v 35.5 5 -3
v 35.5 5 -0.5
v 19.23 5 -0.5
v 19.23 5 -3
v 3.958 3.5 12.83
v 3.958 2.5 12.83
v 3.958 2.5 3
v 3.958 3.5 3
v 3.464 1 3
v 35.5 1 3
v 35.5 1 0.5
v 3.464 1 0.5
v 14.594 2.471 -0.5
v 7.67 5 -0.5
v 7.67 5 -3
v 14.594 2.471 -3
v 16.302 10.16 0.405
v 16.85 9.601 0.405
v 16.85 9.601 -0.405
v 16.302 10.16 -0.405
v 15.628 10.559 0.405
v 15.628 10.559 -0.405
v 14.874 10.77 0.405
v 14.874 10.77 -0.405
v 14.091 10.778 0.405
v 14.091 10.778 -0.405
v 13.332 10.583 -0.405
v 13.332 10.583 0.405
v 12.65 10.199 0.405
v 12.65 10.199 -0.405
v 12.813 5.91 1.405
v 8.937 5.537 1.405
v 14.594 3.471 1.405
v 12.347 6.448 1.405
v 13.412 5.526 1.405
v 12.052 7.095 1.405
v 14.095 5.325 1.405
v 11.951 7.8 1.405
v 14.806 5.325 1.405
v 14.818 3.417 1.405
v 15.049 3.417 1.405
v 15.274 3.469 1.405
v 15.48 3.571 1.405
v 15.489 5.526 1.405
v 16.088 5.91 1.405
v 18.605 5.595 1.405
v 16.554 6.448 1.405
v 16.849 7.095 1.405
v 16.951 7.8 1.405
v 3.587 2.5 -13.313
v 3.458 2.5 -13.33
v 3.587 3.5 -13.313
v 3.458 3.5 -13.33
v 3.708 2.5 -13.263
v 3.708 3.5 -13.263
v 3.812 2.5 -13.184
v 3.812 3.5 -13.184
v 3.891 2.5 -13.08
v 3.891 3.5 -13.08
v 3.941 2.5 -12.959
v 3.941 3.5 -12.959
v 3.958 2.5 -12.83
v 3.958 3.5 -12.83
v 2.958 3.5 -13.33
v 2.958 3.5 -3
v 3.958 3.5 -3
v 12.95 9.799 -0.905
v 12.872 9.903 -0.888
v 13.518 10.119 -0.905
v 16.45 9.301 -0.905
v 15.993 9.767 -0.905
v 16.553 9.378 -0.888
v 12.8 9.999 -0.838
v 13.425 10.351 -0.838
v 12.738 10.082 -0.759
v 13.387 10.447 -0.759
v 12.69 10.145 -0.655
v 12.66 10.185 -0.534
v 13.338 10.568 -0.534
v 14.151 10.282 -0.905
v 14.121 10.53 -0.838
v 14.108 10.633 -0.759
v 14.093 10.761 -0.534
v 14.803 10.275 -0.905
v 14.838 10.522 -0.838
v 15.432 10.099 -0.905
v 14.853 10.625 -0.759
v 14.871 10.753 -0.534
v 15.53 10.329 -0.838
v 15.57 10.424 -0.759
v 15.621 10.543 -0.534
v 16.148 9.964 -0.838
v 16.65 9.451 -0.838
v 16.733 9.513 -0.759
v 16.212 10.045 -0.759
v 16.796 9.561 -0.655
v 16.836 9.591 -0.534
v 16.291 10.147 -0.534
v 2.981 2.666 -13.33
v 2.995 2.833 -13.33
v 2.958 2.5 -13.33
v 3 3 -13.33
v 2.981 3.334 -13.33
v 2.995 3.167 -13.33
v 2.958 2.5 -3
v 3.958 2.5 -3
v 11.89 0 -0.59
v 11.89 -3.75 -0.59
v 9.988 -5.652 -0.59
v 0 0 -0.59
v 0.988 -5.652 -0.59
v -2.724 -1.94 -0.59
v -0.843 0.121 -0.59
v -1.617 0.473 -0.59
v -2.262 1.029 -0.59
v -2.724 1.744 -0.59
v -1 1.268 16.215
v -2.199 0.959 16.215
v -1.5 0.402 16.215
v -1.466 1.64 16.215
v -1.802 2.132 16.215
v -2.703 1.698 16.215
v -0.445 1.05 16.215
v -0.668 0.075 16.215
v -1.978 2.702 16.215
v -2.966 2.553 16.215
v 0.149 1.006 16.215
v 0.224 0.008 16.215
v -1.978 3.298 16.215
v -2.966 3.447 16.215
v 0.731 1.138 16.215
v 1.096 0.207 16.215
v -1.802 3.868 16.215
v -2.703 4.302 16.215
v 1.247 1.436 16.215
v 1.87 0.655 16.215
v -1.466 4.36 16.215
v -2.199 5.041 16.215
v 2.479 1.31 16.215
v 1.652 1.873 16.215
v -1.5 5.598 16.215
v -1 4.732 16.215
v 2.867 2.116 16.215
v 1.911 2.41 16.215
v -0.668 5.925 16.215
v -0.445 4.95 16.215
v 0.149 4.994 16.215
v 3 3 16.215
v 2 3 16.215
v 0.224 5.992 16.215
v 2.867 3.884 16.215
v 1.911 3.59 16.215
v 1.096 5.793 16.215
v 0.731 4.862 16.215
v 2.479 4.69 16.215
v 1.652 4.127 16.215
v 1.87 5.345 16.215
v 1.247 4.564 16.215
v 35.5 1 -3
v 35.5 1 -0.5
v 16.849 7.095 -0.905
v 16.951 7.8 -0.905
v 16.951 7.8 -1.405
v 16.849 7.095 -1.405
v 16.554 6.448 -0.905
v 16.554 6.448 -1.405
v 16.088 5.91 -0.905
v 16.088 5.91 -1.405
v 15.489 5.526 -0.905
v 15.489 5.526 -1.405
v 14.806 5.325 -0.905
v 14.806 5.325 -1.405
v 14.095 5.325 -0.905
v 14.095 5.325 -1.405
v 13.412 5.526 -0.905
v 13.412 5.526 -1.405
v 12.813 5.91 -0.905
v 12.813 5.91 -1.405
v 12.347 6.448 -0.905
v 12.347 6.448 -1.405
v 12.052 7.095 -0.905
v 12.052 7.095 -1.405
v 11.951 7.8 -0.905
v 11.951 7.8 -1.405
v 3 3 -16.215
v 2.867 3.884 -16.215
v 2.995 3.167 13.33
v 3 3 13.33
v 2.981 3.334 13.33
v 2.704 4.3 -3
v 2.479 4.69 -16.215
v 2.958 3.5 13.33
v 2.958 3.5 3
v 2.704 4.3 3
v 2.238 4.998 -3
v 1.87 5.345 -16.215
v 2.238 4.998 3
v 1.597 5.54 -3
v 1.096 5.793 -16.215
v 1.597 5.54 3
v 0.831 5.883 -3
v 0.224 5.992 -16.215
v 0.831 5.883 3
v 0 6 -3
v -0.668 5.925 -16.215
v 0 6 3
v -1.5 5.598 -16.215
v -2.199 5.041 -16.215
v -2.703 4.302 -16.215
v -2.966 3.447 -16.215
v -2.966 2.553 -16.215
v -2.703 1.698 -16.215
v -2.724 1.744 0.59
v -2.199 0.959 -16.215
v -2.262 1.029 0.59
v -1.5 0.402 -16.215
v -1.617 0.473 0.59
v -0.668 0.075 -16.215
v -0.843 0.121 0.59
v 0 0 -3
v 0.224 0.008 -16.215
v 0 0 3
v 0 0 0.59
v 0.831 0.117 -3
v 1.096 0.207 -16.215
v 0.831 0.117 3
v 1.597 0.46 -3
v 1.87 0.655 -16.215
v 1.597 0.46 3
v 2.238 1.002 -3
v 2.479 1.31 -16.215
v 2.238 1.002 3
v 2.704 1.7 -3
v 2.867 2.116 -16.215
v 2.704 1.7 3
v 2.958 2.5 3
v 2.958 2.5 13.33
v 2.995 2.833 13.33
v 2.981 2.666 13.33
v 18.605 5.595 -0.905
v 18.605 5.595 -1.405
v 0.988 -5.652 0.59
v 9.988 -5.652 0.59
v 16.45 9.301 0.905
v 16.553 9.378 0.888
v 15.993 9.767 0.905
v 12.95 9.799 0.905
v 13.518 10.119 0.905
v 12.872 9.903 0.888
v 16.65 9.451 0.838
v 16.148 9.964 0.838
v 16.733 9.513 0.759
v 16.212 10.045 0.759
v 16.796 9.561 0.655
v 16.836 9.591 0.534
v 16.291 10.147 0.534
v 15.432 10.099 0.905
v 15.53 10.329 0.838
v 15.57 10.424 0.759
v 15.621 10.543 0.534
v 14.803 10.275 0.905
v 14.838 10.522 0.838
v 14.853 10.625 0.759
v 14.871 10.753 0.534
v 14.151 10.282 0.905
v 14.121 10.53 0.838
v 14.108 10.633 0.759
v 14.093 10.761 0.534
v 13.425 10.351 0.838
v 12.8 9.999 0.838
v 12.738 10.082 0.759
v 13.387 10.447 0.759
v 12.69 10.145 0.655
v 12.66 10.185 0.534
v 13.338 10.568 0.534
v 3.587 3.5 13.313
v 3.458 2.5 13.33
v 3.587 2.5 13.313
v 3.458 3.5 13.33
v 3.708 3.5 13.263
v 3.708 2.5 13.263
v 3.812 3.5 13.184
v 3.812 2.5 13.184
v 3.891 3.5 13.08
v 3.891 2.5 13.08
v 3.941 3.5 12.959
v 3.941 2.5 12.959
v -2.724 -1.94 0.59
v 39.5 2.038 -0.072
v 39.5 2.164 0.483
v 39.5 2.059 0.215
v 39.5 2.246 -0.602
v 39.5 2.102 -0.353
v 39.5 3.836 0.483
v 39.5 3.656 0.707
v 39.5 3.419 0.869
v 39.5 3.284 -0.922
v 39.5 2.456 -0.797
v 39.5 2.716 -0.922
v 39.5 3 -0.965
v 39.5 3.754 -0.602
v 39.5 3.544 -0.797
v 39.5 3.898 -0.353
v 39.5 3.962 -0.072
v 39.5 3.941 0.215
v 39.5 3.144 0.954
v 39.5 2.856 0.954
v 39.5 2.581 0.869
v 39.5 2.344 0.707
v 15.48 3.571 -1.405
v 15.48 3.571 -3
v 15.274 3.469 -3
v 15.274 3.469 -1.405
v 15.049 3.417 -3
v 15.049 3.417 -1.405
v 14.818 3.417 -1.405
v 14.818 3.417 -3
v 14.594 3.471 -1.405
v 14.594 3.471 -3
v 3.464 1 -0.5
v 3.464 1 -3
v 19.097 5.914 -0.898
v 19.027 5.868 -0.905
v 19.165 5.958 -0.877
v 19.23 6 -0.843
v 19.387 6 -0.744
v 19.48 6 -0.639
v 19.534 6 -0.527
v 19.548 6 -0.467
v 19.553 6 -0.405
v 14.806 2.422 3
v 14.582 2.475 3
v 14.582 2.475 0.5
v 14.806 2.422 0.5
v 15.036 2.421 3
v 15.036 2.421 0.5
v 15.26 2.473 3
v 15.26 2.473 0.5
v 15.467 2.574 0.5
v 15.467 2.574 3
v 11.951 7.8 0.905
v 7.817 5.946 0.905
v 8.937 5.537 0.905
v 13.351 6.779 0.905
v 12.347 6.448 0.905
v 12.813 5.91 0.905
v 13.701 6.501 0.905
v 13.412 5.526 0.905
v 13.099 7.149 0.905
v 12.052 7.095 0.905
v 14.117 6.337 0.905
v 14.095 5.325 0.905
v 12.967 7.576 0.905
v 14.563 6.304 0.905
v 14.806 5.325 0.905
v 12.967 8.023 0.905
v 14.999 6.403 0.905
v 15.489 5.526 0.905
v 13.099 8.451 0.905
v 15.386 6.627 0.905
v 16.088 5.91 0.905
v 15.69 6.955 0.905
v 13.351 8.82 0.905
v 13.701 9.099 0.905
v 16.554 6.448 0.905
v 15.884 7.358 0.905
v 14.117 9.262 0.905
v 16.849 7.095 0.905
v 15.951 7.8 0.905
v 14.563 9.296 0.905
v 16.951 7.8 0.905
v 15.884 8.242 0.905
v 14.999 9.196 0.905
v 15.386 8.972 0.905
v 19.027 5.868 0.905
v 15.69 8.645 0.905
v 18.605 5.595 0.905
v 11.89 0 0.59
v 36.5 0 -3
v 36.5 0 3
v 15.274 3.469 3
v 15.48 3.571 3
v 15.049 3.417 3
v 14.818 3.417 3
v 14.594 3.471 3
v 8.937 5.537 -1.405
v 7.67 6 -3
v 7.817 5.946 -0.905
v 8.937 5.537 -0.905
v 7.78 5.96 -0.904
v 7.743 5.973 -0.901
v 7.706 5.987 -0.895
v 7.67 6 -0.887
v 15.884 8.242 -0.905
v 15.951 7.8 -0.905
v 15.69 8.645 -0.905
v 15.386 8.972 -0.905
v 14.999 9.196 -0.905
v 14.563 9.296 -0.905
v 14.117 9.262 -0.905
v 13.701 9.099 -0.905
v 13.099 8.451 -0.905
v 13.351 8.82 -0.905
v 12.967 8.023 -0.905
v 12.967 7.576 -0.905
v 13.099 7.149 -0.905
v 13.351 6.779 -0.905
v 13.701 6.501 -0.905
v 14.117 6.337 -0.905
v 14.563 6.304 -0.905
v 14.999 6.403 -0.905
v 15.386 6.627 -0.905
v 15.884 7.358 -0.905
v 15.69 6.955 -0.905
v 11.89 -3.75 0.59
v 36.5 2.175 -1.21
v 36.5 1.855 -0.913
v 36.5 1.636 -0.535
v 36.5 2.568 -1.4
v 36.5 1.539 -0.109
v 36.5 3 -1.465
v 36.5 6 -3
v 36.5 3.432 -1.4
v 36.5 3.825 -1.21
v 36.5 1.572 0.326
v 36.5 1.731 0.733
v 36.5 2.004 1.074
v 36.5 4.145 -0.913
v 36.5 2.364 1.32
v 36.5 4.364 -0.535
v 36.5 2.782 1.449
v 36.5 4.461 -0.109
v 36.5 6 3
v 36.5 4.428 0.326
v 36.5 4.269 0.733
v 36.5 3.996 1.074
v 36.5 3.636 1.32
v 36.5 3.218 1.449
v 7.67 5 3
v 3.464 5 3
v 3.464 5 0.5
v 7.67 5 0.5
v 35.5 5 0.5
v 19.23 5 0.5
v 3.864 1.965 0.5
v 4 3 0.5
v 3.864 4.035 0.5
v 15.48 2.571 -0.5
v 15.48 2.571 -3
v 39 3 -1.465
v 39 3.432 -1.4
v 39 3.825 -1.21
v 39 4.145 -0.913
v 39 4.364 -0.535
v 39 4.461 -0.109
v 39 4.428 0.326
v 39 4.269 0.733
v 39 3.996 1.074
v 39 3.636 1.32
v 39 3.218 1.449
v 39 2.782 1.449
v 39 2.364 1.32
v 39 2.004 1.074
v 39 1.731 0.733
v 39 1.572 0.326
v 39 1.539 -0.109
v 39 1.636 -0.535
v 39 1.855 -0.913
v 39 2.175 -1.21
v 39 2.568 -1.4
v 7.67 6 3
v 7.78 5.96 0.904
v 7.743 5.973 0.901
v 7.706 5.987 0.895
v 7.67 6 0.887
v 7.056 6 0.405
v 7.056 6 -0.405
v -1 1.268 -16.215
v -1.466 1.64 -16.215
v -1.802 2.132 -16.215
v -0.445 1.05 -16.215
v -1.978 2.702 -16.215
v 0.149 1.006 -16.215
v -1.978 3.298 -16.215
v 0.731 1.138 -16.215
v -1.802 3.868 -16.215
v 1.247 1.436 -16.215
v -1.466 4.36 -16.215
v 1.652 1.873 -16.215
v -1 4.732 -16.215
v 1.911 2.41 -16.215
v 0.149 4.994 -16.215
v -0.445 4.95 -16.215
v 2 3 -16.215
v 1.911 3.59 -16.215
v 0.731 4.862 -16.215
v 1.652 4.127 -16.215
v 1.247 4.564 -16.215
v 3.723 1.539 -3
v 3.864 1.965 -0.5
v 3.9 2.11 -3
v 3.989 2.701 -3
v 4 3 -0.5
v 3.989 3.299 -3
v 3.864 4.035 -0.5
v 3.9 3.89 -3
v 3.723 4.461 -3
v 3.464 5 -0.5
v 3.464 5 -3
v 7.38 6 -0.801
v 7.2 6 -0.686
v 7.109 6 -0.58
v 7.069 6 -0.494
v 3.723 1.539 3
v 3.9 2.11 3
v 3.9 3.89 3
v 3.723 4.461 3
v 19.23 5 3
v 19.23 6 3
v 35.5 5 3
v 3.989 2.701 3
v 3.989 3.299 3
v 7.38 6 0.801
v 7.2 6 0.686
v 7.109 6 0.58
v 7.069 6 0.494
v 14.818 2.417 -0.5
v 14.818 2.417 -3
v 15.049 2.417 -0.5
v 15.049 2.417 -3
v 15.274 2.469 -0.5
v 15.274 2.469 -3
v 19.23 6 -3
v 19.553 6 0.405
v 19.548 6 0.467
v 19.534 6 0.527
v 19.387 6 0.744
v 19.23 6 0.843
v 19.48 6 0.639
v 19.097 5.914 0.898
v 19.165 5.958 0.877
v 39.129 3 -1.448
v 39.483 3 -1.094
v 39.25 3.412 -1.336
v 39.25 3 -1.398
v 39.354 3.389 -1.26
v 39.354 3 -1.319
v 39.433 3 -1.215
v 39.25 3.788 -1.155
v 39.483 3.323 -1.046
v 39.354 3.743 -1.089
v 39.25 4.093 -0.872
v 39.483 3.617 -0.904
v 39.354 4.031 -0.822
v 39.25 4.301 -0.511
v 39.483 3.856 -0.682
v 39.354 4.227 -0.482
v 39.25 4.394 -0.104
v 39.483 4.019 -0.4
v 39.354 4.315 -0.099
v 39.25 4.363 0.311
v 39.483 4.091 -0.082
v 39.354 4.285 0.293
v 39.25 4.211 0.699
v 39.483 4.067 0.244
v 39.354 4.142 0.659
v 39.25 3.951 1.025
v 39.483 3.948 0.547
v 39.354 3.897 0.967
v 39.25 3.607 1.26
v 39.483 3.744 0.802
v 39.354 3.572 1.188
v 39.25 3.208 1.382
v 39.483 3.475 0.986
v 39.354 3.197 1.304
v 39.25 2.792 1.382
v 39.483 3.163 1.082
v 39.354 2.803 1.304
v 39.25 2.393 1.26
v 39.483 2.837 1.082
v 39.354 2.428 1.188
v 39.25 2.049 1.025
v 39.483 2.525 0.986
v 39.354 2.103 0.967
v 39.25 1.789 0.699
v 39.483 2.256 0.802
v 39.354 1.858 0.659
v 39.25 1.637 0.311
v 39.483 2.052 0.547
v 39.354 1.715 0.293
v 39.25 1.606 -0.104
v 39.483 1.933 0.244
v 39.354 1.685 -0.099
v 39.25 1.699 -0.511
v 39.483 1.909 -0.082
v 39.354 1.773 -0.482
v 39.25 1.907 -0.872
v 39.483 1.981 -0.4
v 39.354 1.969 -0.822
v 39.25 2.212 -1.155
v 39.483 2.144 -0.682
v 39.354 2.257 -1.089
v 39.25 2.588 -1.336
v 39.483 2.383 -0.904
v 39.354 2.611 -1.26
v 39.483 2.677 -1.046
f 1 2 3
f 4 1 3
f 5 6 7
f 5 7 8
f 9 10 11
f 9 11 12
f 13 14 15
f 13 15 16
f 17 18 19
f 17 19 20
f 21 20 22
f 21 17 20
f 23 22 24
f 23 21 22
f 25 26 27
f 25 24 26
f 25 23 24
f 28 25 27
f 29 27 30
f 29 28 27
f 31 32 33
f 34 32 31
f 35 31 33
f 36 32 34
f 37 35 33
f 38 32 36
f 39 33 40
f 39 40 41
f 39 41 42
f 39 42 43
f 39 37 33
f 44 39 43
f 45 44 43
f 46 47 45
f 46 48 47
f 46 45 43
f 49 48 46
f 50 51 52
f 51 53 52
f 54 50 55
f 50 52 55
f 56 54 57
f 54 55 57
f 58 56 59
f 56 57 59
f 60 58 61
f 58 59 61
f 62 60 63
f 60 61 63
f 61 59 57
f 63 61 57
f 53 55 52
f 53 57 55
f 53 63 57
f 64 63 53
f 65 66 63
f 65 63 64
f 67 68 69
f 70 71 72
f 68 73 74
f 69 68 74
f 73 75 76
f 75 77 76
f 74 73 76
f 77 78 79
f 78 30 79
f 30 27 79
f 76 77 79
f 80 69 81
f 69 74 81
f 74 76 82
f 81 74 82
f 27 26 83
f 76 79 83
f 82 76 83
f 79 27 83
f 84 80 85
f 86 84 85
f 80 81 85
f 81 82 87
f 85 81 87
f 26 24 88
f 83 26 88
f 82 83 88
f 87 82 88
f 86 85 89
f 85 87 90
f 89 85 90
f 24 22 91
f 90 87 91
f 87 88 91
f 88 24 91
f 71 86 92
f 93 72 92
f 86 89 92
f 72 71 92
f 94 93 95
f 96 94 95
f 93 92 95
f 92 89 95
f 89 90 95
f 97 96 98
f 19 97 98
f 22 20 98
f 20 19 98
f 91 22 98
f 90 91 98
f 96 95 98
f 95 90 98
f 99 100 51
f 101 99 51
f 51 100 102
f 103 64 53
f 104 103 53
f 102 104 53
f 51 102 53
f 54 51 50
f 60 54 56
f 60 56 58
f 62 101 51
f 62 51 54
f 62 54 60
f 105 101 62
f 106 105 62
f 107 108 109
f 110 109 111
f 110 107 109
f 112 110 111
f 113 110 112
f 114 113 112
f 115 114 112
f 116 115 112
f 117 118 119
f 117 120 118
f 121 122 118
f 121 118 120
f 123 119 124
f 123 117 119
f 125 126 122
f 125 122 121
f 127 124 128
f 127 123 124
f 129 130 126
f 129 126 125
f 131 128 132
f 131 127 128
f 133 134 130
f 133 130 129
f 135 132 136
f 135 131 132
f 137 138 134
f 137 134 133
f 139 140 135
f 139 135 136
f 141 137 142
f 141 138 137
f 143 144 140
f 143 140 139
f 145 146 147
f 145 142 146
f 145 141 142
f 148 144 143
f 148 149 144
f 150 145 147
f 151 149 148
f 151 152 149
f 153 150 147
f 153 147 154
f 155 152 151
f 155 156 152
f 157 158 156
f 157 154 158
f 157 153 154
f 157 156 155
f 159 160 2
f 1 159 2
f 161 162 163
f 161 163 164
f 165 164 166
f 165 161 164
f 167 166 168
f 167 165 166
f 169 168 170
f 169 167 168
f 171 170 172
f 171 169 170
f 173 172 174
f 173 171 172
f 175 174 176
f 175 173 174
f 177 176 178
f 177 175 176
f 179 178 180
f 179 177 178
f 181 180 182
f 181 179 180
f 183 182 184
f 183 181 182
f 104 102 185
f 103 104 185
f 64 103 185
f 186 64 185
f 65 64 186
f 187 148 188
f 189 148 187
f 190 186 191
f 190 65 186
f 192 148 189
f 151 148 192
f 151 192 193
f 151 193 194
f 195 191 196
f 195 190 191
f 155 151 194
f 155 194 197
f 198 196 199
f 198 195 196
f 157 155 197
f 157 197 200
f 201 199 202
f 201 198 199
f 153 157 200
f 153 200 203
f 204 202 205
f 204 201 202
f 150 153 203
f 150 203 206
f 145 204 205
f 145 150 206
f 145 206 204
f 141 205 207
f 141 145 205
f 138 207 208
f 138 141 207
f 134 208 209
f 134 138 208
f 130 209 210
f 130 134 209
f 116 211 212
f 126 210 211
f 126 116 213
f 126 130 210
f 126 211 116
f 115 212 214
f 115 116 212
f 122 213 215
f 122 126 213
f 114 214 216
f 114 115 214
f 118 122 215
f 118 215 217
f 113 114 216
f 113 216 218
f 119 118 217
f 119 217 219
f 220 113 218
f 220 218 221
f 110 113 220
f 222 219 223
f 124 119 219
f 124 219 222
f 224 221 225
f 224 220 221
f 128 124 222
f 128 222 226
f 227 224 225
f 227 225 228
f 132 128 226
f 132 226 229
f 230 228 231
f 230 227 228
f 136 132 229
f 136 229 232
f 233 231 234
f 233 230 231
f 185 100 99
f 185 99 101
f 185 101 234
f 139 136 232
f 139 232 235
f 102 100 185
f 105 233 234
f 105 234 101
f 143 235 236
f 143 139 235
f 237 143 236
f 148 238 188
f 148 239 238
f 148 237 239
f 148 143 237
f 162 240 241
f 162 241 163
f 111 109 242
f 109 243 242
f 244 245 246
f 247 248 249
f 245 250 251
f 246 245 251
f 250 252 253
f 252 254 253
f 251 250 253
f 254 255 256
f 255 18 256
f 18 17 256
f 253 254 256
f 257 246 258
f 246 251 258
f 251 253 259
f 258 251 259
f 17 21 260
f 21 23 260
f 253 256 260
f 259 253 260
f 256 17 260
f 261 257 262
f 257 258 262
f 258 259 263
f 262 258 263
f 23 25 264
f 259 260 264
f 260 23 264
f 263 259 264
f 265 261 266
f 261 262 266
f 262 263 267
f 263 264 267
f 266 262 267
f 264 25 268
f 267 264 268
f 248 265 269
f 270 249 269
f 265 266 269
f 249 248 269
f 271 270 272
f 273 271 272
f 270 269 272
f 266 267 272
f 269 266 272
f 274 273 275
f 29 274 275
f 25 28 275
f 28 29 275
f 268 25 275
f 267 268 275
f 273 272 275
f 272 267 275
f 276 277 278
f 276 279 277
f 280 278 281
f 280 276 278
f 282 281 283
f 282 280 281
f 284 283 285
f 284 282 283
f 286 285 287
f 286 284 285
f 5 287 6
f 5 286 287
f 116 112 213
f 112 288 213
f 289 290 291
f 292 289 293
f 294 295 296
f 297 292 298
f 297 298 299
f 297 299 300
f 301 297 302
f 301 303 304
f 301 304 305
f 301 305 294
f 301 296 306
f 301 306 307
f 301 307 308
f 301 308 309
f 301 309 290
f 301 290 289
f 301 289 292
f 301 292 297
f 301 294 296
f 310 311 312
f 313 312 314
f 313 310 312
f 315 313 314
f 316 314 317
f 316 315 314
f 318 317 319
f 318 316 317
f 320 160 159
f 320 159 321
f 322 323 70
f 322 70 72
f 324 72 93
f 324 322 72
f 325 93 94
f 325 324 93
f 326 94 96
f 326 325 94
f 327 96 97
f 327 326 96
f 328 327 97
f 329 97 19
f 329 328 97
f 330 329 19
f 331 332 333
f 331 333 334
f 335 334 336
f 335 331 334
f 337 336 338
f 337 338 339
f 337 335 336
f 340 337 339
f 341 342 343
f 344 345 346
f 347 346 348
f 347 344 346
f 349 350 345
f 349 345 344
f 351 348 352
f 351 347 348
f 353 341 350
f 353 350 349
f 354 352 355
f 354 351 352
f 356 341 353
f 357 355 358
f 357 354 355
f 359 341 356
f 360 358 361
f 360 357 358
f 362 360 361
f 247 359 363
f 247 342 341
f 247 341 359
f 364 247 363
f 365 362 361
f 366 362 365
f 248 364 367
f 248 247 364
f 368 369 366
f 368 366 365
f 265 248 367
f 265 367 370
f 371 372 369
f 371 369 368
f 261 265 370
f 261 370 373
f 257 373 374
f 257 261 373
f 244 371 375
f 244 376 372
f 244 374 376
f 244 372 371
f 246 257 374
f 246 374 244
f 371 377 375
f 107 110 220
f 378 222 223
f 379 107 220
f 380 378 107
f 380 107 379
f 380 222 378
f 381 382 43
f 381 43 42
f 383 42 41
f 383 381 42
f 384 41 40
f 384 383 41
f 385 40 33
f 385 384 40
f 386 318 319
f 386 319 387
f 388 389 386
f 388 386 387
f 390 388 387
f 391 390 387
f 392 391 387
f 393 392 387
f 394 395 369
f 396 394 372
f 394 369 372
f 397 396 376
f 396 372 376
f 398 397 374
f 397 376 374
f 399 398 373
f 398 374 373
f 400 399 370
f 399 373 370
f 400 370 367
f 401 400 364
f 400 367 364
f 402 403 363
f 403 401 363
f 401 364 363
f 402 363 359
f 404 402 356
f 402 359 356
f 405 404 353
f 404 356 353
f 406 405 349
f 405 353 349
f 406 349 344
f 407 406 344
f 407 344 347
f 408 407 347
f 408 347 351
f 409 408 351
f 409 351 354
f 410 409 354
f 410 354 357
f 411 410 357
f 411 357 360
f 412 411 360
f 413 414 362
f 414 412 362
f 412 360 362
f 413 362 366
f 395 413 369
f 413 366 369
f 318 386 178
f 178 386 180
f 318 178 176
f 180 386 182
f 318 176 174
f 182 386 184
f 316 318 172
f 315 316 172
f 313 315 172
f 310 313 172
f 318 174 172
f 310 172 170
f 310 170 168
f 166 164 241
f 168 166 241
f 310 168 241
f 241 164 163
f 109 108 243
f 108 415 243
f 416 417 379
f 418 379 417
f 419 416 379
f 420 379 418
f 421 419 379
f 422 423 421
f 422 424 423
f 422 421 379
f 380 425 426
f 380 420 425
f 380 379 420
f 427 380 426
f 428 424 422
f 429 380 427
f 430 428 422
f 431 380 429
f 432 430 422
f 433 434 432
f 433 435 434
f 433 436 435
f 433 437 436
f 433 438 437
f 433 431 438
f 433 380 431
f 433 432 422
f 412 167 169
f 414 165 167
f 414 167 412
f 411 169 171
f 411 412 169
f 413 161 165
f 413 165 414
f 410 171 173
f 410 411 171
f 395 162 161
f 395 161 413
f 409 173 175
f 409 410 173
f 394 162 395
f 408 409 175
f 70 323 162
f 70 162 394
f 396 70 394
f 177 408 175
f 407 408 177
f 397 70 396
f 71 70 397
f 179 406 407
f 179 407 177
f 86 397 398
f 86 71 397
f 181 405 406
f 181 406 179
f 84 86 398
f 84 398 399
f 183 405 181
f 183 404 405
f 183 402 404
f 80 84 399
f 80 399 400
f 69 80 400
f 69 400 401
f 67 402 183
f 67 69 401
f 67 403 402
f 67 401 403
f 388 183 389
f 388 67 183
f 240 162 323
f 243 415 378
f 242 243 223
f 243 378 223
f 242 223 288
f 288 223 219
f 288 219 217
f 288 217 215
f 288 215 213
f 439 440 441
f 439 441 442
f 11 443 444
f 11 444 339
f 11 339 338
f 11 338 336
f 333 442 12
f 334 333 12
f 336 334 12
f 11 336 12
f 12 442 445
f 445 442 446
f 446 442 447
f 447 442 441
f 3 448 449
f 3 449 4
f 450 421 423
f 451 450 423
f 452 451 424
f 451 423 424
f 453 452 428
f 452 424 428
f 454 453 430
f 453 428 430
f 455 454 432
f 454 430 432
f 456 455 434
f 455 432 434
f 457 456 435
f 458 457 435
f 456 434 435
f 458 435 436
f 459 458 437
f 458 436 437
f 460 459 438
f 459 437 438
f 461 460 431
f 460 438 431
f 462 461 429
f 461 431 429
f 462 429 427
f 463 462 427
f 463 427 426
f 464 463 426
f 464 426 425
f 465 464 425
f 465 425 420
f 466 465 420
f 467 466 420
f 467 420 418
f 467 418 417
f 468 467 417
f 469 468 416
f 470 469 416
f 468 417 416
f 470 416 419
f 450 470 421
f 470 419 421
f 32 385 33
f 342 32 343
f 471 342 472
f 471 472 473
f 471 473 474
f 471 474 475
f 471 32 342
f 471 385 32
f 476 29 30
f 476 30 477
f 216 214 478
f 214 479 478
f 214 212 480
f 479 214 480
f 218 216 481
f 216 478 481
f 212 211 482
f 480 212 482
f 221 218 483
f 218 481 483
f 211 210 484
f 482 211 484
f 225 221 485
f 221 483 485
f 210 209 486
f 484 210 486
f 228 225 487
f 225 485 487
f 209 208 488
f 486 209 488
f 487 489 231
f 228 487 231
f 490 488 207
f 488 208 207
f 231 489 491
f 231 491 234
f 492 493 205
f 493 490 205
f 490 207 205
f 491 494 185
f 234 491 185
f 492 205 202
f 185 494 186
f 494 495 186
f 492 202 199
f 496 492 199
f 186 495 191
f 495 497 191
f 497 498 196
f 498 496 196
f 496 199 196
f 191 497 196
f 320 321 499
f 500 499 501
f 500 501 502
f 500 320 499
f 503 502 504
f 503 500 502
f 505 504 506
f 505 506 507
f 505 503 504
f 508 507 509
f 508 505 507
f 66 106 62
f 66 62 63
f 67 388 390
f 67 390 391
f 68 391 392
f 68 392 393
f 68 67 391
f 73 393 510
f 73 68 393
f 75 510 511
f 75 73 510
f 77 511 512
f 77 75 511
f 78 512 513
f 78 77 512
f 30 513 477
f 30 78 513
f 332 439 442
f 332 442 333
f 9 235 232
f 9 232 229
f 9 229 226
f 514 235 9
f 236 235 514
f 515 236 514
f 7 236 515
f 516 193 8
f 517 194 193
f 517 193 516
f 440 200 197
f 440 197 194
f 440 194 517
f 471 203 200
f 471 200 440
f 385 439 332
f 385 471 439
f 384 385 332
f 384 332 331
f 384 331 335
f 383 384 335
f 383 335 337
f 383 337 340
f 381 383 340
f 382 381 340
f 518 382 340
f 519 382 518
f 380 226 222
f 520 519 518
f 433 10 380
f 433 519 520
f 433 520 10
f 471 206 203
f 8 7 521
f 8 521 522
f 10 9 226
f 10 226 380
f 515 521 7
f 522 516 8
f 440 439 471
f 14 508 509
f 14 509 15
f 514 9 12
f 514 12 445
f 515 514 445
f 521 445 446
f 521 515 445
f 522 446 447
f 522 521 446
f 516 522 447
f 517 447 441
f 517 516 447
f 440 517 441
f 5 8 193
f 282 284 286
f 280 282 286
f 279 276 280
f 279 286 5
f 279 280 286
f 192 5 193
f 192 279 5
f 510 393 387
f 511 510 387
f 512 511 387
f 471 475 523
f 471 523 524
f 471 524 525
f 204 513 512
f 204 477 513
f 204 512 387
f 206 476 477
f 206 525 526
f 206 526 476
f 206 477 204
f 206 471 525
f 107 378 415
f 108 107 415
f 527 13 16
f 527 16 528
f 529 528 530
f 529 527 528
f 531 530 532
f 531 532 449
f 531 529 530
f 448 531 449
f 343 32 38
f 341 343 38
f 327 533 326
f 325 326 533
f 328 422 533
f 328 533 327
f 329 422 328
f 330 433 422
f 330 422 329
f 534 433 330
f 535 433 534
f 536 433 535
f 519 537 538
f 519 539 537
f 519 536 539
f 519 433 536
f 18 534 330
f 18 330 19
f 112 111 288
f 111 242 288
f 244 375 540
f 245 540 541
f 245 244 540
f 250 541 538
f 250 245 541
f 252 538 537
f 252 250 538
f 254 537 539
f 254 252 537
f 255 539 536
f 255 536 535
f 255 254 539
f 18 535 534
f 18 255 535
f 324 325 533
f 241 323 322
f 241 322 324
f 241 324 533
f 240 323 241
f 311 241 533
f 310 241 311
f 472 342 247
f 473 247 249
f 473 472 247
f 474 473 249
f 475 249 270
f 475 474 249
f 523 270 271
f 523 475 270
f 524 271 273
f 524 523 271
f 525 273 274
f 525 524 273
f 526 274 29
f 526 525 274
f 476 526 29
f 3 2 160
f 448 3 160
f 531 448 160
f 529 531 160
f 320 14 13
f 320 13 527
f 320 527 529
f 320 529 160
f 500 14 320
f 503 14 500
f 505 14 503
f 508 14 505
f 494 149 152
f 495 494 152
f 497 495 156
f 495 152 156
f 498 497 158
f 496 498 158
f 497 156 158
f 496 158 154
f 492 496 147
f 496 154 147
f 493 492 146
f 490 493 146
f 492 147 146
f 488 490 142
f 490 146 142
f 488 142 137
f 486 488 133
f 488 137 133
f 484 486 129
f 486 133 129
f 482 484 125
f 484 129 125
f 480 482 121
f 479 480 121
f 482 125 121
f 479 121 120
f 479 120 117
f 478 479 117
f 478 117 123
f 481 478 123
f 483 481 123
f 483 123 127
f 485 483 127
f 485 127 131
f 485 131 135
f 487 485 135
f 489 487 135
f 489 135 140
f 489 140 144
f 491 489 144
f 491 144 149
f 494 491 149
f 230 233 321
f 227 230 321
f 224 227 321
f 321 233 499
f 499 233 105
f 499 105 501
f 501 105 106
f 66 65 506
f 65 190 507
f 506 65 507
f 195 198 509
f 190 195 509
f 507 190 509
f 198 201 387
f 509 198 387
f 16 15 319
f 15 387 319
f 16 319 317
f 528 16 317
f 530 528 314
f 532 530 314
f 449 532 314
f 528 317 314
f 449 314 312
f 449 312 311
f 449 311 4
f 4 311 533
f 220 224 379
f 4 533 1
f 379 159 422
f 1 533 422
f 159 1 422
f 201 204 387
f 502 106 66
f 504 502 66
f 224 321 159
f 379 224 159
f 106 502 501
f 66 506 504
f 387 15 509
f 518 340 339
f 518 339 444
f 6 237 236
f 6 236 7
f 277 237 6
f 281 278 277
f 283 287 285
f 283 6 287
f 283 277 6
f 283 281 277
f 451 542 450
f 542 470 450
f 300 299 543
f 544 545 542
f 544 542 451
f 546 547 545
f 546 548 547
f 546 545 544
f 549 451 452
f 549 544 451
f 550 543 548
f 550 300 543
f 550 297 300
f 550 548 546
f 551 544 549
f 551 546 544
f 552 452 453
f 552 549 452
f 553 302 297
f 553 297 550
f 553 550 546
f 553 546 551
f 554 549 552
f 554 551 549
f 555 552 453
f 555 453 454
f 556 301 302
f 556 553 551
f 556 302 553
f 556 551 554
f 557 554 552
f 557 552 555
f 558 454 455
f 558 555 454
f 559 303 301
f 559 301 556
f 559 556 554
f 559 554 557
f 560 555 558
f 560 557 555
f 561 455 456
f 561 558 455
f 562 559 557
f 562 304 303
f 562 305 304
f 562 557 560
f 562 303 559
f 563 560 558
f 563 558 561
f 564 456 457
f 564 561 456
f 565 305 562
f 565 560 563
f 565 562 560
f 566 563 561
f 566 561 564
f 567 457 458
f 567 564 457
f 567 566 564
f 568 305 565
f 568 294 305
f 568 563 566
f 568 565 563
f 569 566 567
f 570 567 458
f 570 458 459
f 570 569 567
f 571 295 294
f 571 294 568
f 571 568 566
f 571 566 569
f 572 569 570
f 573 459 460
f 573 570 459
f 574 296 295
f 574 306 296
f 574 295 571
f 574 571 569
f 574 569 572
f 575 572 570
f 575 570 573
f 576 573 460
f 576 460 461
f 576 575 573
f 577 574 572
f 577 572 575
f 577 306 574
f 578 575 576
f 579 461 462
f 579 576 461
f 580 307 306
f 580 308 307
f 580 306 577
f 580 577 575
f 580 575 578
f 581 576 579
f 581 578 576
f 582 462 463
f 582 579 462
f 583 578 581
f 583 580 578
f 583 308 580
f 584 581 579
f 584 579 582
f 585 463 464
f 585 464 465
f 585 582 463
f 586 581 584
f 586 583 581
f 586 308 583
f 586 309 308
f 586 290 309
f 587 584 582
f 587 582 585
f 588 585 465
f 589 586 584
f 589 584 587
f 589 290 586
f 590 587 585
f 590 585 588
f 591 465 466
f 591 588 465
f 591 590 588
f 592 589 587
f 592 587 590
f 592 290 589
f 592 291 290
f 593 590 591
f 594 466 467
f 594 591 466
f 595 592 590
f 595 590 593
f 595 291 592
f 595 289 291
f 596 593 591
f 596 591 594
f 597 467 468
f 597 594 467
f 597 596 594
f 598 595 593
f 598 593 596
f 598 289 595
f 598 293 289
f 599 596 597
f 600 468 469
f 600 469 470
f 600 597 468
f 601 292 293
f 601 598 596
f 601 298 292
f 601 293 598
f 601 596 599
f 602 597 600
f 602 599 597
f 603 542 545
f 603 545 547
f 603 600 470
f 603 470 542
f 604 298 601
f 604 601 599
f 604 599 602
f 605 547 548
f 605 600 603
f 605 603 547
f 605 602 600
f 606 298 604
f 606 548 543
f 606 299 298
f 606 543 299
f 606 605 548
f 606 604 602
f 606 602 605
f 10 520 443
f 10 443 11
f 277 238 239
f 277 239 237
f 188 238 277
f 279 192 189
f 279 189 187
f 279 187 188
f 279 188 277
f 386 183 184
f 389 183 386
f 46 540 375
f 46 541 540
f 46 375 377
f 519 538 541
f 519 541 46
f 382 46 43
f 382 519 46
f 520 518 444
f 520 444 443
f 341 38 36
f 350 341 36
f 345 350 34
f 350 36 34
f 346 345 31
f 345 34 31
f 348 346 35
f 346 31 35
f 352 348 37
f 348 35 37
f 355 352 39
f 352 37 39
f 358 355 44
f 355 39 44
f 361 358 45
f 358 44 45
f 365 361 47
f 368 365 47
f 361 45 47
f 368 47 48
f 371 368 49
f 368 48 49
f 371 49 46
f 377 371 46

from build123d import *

# Parameters (mm, degrees)
BOSS_EXTRUDE3_DEPTH  = 3
SKETCH6_R            = 1.465
BOSS_EXTRUDE7_DEPTH  = 3
FILLET1_R            = 0.5
SKETCH7_R            = 2.9999999999999982
BOSS_EXTRUDE8_DEPTH  = 16.215
BOSS_EXTRUDE9_DEPTH  = 1.405
SKETCH9_R            = 2
CUT_EXTRUDE1_DEPTH   = 35
SKETCH10_R           = 1.5000000000000009
CUT_EXTRUDE2_DEPTH   = 35
CUT_EXTRUDE3_DEPTH   = 2.5
CUT_EXTRUDE4_START   = -2.5
CUT_EXTRUDE4_DEPTH   = 2.5
BOSS_EXTRUDE10_DEPTH = 0.59
BOSS_EXTRUDE11_DEPTH = 13.33
FILLET2_R            = 0.5
FILLET3_R            = 0.5
SKETCH12_R           = 1.5000000000000009
CUT_EXTRUDE5_DEPTH   = 0.5
FILLET4_R            = 0.5
CUT_EXTRUDE6_START   = -0.5
SKETCH17_R           = 1.5000000000000009
CUT_EXTRUDE6_DEPTH   = 0.5
FILLET5_R            = 0.5


with BuildPart() as part:
    # Sketch1 → Boss-Extrude3 (new, symmetric)
    with BuildSketch(Plane.XY):
        with BuildLine():
            ThreePointArc((2.9999999999999982, 2.9999999999999973), (2.1213203435596406, 0.8786796564403563), (-5.5e-16, 0))
            Line((0, 0), (36.5, 0))
            Line((36.5, 0), (36.5, 6))
            Line((36.5, 6), (19.23, 5.999999999999999))
            Line((19.23, 5.999999999999999), (15.480454164508112, 3.571071981637192))
            ThreePointArc((15.480454164508112, 3.571071981637192), (15.048841816271192, 3.4166611598413845), (14.593679363207029, 3.4710584241003293))
            Line((14.593679363207029, 3.4710584241003297), (7.67, 5.999999999999995))
            Line((7.67, 5.999999999999995), (0, 5.9999999999999964))
            ThreePointArc((1.8e-16, 5.9999999999999964), (2.1213203435596415, 5.121320343559639), (2.9999999999999982, 2.9999999999999982))
        make_face()
    extrude(amount=BOSS_EXTRUDE3_DEPTH, both=True)

    # Sketch6 → Boss-Extrude7 (add)
    with BuildSketch(Plane(origin=(36.5, 0, 0), x_dir=(0, 0, -1), z_dir=(1, 0, 0))):
        with Locations((0, 2.999999999999999)):
            Circle(SKETCH6_R)
    extrude(amount=BOSS_EXTRUDE7_DEPTH)

    # Fillet1
    fillet1_edges = [part.edges().sort_by_distance(p)[0] for p in [
        (39.5, 2.9999999999999987, 1.465),
    ]]
    fillet(fillet1_edges, radius=FILLET1_R)

    # Sketch7 → Boss-Extrude8 (add, symmetric)
    with BuildSketch(Plane.XY):
        with Locations((0, 2.9999999999999982)):
            Circle(SKETCH7_R)
    extrude(amount=BOSS_EXTRUDE8_DEPTH, both=True)

    # Sketch8 → Boss-Extrude9 (add, symmetric)
    with BuildSketch(Plane.XY):
        with BuildLine():
            Line((7.055802237198053, 5.999999999999995), (7.67, 5.999999999999995))
            Line((7.67, 5.999999999999995), (7.67, 2.7155970544612273))
            Line((7.67, 2.7155970544612273), (19.552760462470925, 2.7155970544612273))
            Line((19.552760462470925, 2.7155970544612273), (19.552760462470925, 5.999999999999999))
            Line((19.552760462470925, 5.999999999999999), (16.849844518078097, 9.600752353739953))
            ThreePointArc((16.849844518078097, 9.600752353739953), (14.873619928851438, 10.76977515573235), (12.649594170011149, 10.19899729819309))
            Line((12.649594170011149, 10.19899729819309), (7.055802237198053, 5.999999999999995))
        make_face()
    extrude(amount=BOSS_EXTRUDE9_DEPTH, both=True)

    # Sketch9 → Cut-Extrude1 (cut)
    with BuildSketch(Plane.XY.offset(16.215)):
        with Locations((0, 2.9999999999999982)):
            Circle(SKETCH9_R)
    extrude(amount=-CUT_EXTRUDE1_DEPTH, mode=Mode.SUBTRACT)

    # Sketch10 → Cut-Extrude2 (cut)
    with BuildSketch(Plane.XY.offset(1.405)):
        with Locations((14.450596871818059, 7.799749651933077)):
            Circle(SKETCH10_R)
    extrude(amount=-CUT_EXTRUDE2_DEPTH, mode=Mode.SUBTRACT)

    # Sketch11 → Cut-Extrude3 (cut)
    with BuildSketch(Plane.XY.offset(3)):
        with BuildLine():
            Line((35.5, 4.999999999999999), (19.23, 4.999999999999999))
            Line((19.23, 4.999999999999999), (15.46672588726192, 2.5741759140057563))
            ThreePointArc((15.46672588726192, 2.5741759140057563), (15.035884938334876, 2.420860249555603), (14.581839900445662, 2.475382903620951))
            Line((14.581839900445662, 2.475382903620951), (7.67, 4.9999999999999964))
            Line((7.67, 4.9999999999999964), (3.4641016151377535, 4.9999999999999964))
            ThreePointArc((3.464101615137754, 4.9999999999999964), (3.999999999999998, 2.9999999999999982), (3.464101615137754, 0.9999999999999998))
            Line((3.4641016151377535, 0.9999999999999999), (35.5, 1))
            Line((35.5, 1), (35.5, 4.999999999999999))
        make_face()
    extrude(amount=-CUT_EXTRUDE3_DEPTH, mode=Mode.SUBTRACT)

    # Sketch14 → Cut-Extrude4 (cut)
    with BuildSketch(Plane(origin=(0, 0, -3), x_dir=(-1, 0, 0), z_dir=(0, 0, -1)).offset(CUT_EXTRUDE4_START)):
        with BuildLine():
            Line((-19.23, 4.999999999999999), (-35.5, 4.999999999999999))
            Line((-35.5, 4.999999999999999), (-35.5, 1))
            Line((-35.5, 1), (-3.46410161513775, 1))
            ThreePointArc((-3.4641016151377535, 1), (-3.999999999999998, 2.9999999999999982), (-3.4641016151377535, 4.9999999999999964))
            Line((-3.4641016151377535, 4.9999999999999964), (-7.67, 4.9999999999999964))
            Line((-7.67, 4.9999999999999964), (-14.593679363207022, 2.471058424100332))
            ThreePointArc((-14.593679363207022, 2.471058424100332), (-15.048841816271192, 2.4166611598413854), (-15.480454164508119, 2.5710719816371976))
            Line((-15.480454164508119, 2.571071981637197), (-19.23, 4.999999999999999))
        make_face()
    extrude(amount=CUT_EXTRUDE4_DEPTH, mode=Mode.SUBTRACT)

    # Sketch15 → Boss-Extrude10 (add, symmetric)
    with BuildSketch(Plane.XY):
        with BuildLine():
            Line((11.889999999999997, -3.01e-15), (11.889999999999997, -3.750000000000003))
            Line((11.889999999999997, -3.750000000000003), (9.987882758608185, -5.652117241391816))
            Line((9.987882758608185, -5.652117241391816), (0.9878827586081856, -5.652117241391818))
            Line((0.9878827586081856, -5.652117241391818), (-2.7244278426211888, -1.9398066401624436))
            Line((-2.7244278426211888, -1.9398066401624436), (-2.7244278426211888, 1.7440171456781548))
            ThreePointArc((-2.7244278426211888, 1.7440171456781548), (-1.6174132800608587, 0.47334721786258305), (0, 0))
            Line((0, 0), (11.889999999999997, -3.01e-15))
        make_face()
    extrude(amount=BOSS_EXTRUDE10_DEPTH, both=True)

    # Sketch16 → Boss-Extrude11 (add, symmetric)
    with BuildSketch(Plane.XY):
        with BuildLine():
            Line((3.9580398915498063, 2.4999999999999982), (3.9580398915498063, 3.4999999999999982))
            Line((3.9580398915498063, 3.4999999999999982), (2.9580398915498067, 3.4999999999999982))
            ThreePointArc((2.9580398915498067, 3.4999999999999982), (2.9999999999999925, 2.9999999999999982), (2.9580398915498067, 2.4999999999999982))
            Line((2.9580398915498067, 2.4999999999999982), (3.9580398915498063, 2.4999999999999982))
        make_face()
    extrude(amount=BOSS_EXTRUDE11_DEPTH, both=True)

    # Fillet2
    fillet2_edges = [part.edges().sort_by_distance(p)[0] for p in [
        (3.9580398915498063, 2.9999999999999982, 13.33),
    ]]
    fillet(fillet2_edges, radius=FILLET2_R)

    # Fillet3
    fillet3_edges = [part.edges().sort_by_distance(p)[0] for p in [
        (3.9580398915498063, 2.9999999999999982, -13.33),
    ]]
    fillet(fillet3_edges, radius=FILLET3_R)

    # Sketch12 → Cut-Extrude5 (cut)
    with BuildSketch(Plane.XY.offset(1.405)):
        with BuildLine():
            Line((8.93667028661393, 5.537336294370084), (11.950596871818057, 7.799749651933077))
            ThreePointArc((11.950596871818057, 7.799749651933077), (14.45059687181806, 5.299749651933041), (16.950596871818053, 7.7997496519330864))
            Line((16.95059687181806, 7.799749651933077), (18.60533758587746, 5.595348315169656))
            Line((18.60533758587746, 5.595348315169656), (19.230000000000004, 5.999999999999997))
            Line((19.230000000000004, 5.999999999999997), (19.552760462470925, 5.999999999999999))
            Line((19.552760462470925, 5.999999999999999), (16.849844518078097, 9.600752353739953))
            ThreePointArc((16.849844518078097, 9.600752353739953), (14.873619928851436, 10.769775155732342), (12.649594170011149, 10.19899729819309))
            Line((12.649594170011149, 10.19899729819309), (7.055802237198053, 5.999999999999995))
            Line((7.055802237198053, 5.999999999999995), (7.67, 5.999999999999995))
            Line((7.67, 5.999999999999995), (8.93667028661393, 5.537336294370084))
        make_face()
        with Locations((14.450596871818059, 7.799749651933077)):
            Circle(SKETCH12_R, mode=Mode.SUBTRACT)
    extrude(amount=-CUT_EXTRUDE5_DEPTH, mode=Mode.SUBTRACT)

    # Fillet4
    fillet4_edges = [part.edges().sort_by_distance(p)[0] for p in [
        (18.20130249027451, 7.800376176869976, 0.905),
        (9.8526982036046, 8.099498649096542, 0.905),
        (14.873619928851436, 10.769775155732344, 0.905),
    ]]
    fillet(fillet4_edges, radius=FILLET4_R)

    # Sketch17 → Cut-Extrude6 (cut)
    with BuildSketch(Plane(origin=(0, 0, -1.405), x_dir=(-1, 0, 0), z_dir=(0, 0, -1)).offset(CUT_EXTRUDE6_START)):
        with BuildLine():
            Line((-18.60533758587746, 5.595348315169656), (-16.95059687181806, 7.799749651933077))
            ThreePointArc((-16.95059687181806, 7.799749651933077), (-14.450596871818068, 5.299749651933066), (-11.950596871818057, 7.79974965193306))
            Line((-11.950596871818059, 7.799749651933077), (-8.93667028661393, 5.537336294370084))
            Line((-8.93667028661393, 5.537336294370084), (-7.67, 5.999999999999995))
            Line((-7.67, 5.999999999999995), (-7.055802237198053, 5.999999999999995))
            Line((-7.055802237198053, 5.999999999999995), (-12.649594170011149, 10.19899729819309))
            ThreePointArc((-12.649594170011149, 10.19899729819309), (-14.873619928851438, 10.769775155732347), (-16.849844518078097, 9.600752353739953))
            Line((-16.849844518078097, 9.600752353739953), (-19.552760462470925, 5.999999999999999))
            Line((-19.552760462470925, 5.999999999999999), (-19.23, 5.999999999999999))
            Line((-19.23, 5.999999999999999), (-18.60533758587746, 5.595348315169656))
        make_face()
        with Locations((-14.450596871818059, 7.799749651933077)):
            Circle(SKETCH17_R, mode=Mode.SUBTRACT)
    extrude(amount=CUT_EXTRUDE6_DEPTH, mode=Mode.SUBTRACT)

    # Fillet5
    fillet5_edges = [part.edges().sort_by_distance(p)[0] for p in [
        (9.8526982036046, 8.099498649096542, -0.905),
        (18.20130249027451, 7.800376176869976, -0.905),
        (14.873619928851438, 10.769775155732347, -0.905),
    ]]
    fillet(fillet5_edges, radius=FILLET5_R)


solid = part.part
